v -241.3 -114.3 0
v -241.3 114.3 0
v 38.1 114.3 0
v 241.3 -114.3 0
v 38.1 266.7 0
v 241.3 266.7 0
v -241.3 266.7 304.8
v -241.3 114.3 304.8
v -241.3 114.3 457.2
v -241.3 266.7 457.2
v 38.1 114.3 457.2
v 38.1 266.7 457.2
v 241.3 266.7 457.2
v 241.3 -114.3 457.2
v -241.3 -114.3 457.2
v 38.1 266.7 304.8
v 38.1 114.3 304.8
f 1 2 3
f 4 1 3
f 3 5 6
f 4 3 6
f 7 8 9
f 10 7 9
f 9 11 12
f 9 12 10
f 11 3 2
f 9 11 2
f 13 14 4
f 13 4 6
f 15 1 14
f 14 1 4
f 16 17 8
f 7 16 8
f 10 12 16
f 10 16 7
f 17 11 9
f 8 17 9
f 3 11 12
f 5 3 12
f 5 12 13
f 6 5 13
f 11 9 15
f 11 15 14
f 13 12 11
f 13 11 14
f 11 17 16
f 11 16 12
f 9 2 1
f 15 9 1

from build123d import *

# Parameters (mm, degrees)
F0_W     = 203.2
F0_H     = 152.4
F1_DEPTH = 457.2
F2_W     = 279.4
F2_H     = 152.4
F3_DEPTH = 152.4


with BuildPart() as f1:
    # F0 (on Top) → F1 (new body)
    with BuildSketch(Plane.XY):
        Polygon((38.1, 114.3), (-241.3, 114.3), (-241.3, -114.3), (241.3, -114.3), (241.3, 114.3), align=None)
        with Locations((139.7, 190.5)):
            Rectangle(F0_W, F0_H)
    extrude(amount=F1_DEPTH)


with BuildPart() as f3:
    # F2 (on face) → F3 (new body)
    with BuildSketch(Plane(origin=(0, 114.3, 0), x_dir=(-1, 0, 0), z_dir=(0, 1, 0))):
        with Locations((101.6, 381)):
            Rectangle(F2_W, F2_H)
    extrude(amount=F3_DEPTH)


solid = Compound([f1.part, f3.part])
